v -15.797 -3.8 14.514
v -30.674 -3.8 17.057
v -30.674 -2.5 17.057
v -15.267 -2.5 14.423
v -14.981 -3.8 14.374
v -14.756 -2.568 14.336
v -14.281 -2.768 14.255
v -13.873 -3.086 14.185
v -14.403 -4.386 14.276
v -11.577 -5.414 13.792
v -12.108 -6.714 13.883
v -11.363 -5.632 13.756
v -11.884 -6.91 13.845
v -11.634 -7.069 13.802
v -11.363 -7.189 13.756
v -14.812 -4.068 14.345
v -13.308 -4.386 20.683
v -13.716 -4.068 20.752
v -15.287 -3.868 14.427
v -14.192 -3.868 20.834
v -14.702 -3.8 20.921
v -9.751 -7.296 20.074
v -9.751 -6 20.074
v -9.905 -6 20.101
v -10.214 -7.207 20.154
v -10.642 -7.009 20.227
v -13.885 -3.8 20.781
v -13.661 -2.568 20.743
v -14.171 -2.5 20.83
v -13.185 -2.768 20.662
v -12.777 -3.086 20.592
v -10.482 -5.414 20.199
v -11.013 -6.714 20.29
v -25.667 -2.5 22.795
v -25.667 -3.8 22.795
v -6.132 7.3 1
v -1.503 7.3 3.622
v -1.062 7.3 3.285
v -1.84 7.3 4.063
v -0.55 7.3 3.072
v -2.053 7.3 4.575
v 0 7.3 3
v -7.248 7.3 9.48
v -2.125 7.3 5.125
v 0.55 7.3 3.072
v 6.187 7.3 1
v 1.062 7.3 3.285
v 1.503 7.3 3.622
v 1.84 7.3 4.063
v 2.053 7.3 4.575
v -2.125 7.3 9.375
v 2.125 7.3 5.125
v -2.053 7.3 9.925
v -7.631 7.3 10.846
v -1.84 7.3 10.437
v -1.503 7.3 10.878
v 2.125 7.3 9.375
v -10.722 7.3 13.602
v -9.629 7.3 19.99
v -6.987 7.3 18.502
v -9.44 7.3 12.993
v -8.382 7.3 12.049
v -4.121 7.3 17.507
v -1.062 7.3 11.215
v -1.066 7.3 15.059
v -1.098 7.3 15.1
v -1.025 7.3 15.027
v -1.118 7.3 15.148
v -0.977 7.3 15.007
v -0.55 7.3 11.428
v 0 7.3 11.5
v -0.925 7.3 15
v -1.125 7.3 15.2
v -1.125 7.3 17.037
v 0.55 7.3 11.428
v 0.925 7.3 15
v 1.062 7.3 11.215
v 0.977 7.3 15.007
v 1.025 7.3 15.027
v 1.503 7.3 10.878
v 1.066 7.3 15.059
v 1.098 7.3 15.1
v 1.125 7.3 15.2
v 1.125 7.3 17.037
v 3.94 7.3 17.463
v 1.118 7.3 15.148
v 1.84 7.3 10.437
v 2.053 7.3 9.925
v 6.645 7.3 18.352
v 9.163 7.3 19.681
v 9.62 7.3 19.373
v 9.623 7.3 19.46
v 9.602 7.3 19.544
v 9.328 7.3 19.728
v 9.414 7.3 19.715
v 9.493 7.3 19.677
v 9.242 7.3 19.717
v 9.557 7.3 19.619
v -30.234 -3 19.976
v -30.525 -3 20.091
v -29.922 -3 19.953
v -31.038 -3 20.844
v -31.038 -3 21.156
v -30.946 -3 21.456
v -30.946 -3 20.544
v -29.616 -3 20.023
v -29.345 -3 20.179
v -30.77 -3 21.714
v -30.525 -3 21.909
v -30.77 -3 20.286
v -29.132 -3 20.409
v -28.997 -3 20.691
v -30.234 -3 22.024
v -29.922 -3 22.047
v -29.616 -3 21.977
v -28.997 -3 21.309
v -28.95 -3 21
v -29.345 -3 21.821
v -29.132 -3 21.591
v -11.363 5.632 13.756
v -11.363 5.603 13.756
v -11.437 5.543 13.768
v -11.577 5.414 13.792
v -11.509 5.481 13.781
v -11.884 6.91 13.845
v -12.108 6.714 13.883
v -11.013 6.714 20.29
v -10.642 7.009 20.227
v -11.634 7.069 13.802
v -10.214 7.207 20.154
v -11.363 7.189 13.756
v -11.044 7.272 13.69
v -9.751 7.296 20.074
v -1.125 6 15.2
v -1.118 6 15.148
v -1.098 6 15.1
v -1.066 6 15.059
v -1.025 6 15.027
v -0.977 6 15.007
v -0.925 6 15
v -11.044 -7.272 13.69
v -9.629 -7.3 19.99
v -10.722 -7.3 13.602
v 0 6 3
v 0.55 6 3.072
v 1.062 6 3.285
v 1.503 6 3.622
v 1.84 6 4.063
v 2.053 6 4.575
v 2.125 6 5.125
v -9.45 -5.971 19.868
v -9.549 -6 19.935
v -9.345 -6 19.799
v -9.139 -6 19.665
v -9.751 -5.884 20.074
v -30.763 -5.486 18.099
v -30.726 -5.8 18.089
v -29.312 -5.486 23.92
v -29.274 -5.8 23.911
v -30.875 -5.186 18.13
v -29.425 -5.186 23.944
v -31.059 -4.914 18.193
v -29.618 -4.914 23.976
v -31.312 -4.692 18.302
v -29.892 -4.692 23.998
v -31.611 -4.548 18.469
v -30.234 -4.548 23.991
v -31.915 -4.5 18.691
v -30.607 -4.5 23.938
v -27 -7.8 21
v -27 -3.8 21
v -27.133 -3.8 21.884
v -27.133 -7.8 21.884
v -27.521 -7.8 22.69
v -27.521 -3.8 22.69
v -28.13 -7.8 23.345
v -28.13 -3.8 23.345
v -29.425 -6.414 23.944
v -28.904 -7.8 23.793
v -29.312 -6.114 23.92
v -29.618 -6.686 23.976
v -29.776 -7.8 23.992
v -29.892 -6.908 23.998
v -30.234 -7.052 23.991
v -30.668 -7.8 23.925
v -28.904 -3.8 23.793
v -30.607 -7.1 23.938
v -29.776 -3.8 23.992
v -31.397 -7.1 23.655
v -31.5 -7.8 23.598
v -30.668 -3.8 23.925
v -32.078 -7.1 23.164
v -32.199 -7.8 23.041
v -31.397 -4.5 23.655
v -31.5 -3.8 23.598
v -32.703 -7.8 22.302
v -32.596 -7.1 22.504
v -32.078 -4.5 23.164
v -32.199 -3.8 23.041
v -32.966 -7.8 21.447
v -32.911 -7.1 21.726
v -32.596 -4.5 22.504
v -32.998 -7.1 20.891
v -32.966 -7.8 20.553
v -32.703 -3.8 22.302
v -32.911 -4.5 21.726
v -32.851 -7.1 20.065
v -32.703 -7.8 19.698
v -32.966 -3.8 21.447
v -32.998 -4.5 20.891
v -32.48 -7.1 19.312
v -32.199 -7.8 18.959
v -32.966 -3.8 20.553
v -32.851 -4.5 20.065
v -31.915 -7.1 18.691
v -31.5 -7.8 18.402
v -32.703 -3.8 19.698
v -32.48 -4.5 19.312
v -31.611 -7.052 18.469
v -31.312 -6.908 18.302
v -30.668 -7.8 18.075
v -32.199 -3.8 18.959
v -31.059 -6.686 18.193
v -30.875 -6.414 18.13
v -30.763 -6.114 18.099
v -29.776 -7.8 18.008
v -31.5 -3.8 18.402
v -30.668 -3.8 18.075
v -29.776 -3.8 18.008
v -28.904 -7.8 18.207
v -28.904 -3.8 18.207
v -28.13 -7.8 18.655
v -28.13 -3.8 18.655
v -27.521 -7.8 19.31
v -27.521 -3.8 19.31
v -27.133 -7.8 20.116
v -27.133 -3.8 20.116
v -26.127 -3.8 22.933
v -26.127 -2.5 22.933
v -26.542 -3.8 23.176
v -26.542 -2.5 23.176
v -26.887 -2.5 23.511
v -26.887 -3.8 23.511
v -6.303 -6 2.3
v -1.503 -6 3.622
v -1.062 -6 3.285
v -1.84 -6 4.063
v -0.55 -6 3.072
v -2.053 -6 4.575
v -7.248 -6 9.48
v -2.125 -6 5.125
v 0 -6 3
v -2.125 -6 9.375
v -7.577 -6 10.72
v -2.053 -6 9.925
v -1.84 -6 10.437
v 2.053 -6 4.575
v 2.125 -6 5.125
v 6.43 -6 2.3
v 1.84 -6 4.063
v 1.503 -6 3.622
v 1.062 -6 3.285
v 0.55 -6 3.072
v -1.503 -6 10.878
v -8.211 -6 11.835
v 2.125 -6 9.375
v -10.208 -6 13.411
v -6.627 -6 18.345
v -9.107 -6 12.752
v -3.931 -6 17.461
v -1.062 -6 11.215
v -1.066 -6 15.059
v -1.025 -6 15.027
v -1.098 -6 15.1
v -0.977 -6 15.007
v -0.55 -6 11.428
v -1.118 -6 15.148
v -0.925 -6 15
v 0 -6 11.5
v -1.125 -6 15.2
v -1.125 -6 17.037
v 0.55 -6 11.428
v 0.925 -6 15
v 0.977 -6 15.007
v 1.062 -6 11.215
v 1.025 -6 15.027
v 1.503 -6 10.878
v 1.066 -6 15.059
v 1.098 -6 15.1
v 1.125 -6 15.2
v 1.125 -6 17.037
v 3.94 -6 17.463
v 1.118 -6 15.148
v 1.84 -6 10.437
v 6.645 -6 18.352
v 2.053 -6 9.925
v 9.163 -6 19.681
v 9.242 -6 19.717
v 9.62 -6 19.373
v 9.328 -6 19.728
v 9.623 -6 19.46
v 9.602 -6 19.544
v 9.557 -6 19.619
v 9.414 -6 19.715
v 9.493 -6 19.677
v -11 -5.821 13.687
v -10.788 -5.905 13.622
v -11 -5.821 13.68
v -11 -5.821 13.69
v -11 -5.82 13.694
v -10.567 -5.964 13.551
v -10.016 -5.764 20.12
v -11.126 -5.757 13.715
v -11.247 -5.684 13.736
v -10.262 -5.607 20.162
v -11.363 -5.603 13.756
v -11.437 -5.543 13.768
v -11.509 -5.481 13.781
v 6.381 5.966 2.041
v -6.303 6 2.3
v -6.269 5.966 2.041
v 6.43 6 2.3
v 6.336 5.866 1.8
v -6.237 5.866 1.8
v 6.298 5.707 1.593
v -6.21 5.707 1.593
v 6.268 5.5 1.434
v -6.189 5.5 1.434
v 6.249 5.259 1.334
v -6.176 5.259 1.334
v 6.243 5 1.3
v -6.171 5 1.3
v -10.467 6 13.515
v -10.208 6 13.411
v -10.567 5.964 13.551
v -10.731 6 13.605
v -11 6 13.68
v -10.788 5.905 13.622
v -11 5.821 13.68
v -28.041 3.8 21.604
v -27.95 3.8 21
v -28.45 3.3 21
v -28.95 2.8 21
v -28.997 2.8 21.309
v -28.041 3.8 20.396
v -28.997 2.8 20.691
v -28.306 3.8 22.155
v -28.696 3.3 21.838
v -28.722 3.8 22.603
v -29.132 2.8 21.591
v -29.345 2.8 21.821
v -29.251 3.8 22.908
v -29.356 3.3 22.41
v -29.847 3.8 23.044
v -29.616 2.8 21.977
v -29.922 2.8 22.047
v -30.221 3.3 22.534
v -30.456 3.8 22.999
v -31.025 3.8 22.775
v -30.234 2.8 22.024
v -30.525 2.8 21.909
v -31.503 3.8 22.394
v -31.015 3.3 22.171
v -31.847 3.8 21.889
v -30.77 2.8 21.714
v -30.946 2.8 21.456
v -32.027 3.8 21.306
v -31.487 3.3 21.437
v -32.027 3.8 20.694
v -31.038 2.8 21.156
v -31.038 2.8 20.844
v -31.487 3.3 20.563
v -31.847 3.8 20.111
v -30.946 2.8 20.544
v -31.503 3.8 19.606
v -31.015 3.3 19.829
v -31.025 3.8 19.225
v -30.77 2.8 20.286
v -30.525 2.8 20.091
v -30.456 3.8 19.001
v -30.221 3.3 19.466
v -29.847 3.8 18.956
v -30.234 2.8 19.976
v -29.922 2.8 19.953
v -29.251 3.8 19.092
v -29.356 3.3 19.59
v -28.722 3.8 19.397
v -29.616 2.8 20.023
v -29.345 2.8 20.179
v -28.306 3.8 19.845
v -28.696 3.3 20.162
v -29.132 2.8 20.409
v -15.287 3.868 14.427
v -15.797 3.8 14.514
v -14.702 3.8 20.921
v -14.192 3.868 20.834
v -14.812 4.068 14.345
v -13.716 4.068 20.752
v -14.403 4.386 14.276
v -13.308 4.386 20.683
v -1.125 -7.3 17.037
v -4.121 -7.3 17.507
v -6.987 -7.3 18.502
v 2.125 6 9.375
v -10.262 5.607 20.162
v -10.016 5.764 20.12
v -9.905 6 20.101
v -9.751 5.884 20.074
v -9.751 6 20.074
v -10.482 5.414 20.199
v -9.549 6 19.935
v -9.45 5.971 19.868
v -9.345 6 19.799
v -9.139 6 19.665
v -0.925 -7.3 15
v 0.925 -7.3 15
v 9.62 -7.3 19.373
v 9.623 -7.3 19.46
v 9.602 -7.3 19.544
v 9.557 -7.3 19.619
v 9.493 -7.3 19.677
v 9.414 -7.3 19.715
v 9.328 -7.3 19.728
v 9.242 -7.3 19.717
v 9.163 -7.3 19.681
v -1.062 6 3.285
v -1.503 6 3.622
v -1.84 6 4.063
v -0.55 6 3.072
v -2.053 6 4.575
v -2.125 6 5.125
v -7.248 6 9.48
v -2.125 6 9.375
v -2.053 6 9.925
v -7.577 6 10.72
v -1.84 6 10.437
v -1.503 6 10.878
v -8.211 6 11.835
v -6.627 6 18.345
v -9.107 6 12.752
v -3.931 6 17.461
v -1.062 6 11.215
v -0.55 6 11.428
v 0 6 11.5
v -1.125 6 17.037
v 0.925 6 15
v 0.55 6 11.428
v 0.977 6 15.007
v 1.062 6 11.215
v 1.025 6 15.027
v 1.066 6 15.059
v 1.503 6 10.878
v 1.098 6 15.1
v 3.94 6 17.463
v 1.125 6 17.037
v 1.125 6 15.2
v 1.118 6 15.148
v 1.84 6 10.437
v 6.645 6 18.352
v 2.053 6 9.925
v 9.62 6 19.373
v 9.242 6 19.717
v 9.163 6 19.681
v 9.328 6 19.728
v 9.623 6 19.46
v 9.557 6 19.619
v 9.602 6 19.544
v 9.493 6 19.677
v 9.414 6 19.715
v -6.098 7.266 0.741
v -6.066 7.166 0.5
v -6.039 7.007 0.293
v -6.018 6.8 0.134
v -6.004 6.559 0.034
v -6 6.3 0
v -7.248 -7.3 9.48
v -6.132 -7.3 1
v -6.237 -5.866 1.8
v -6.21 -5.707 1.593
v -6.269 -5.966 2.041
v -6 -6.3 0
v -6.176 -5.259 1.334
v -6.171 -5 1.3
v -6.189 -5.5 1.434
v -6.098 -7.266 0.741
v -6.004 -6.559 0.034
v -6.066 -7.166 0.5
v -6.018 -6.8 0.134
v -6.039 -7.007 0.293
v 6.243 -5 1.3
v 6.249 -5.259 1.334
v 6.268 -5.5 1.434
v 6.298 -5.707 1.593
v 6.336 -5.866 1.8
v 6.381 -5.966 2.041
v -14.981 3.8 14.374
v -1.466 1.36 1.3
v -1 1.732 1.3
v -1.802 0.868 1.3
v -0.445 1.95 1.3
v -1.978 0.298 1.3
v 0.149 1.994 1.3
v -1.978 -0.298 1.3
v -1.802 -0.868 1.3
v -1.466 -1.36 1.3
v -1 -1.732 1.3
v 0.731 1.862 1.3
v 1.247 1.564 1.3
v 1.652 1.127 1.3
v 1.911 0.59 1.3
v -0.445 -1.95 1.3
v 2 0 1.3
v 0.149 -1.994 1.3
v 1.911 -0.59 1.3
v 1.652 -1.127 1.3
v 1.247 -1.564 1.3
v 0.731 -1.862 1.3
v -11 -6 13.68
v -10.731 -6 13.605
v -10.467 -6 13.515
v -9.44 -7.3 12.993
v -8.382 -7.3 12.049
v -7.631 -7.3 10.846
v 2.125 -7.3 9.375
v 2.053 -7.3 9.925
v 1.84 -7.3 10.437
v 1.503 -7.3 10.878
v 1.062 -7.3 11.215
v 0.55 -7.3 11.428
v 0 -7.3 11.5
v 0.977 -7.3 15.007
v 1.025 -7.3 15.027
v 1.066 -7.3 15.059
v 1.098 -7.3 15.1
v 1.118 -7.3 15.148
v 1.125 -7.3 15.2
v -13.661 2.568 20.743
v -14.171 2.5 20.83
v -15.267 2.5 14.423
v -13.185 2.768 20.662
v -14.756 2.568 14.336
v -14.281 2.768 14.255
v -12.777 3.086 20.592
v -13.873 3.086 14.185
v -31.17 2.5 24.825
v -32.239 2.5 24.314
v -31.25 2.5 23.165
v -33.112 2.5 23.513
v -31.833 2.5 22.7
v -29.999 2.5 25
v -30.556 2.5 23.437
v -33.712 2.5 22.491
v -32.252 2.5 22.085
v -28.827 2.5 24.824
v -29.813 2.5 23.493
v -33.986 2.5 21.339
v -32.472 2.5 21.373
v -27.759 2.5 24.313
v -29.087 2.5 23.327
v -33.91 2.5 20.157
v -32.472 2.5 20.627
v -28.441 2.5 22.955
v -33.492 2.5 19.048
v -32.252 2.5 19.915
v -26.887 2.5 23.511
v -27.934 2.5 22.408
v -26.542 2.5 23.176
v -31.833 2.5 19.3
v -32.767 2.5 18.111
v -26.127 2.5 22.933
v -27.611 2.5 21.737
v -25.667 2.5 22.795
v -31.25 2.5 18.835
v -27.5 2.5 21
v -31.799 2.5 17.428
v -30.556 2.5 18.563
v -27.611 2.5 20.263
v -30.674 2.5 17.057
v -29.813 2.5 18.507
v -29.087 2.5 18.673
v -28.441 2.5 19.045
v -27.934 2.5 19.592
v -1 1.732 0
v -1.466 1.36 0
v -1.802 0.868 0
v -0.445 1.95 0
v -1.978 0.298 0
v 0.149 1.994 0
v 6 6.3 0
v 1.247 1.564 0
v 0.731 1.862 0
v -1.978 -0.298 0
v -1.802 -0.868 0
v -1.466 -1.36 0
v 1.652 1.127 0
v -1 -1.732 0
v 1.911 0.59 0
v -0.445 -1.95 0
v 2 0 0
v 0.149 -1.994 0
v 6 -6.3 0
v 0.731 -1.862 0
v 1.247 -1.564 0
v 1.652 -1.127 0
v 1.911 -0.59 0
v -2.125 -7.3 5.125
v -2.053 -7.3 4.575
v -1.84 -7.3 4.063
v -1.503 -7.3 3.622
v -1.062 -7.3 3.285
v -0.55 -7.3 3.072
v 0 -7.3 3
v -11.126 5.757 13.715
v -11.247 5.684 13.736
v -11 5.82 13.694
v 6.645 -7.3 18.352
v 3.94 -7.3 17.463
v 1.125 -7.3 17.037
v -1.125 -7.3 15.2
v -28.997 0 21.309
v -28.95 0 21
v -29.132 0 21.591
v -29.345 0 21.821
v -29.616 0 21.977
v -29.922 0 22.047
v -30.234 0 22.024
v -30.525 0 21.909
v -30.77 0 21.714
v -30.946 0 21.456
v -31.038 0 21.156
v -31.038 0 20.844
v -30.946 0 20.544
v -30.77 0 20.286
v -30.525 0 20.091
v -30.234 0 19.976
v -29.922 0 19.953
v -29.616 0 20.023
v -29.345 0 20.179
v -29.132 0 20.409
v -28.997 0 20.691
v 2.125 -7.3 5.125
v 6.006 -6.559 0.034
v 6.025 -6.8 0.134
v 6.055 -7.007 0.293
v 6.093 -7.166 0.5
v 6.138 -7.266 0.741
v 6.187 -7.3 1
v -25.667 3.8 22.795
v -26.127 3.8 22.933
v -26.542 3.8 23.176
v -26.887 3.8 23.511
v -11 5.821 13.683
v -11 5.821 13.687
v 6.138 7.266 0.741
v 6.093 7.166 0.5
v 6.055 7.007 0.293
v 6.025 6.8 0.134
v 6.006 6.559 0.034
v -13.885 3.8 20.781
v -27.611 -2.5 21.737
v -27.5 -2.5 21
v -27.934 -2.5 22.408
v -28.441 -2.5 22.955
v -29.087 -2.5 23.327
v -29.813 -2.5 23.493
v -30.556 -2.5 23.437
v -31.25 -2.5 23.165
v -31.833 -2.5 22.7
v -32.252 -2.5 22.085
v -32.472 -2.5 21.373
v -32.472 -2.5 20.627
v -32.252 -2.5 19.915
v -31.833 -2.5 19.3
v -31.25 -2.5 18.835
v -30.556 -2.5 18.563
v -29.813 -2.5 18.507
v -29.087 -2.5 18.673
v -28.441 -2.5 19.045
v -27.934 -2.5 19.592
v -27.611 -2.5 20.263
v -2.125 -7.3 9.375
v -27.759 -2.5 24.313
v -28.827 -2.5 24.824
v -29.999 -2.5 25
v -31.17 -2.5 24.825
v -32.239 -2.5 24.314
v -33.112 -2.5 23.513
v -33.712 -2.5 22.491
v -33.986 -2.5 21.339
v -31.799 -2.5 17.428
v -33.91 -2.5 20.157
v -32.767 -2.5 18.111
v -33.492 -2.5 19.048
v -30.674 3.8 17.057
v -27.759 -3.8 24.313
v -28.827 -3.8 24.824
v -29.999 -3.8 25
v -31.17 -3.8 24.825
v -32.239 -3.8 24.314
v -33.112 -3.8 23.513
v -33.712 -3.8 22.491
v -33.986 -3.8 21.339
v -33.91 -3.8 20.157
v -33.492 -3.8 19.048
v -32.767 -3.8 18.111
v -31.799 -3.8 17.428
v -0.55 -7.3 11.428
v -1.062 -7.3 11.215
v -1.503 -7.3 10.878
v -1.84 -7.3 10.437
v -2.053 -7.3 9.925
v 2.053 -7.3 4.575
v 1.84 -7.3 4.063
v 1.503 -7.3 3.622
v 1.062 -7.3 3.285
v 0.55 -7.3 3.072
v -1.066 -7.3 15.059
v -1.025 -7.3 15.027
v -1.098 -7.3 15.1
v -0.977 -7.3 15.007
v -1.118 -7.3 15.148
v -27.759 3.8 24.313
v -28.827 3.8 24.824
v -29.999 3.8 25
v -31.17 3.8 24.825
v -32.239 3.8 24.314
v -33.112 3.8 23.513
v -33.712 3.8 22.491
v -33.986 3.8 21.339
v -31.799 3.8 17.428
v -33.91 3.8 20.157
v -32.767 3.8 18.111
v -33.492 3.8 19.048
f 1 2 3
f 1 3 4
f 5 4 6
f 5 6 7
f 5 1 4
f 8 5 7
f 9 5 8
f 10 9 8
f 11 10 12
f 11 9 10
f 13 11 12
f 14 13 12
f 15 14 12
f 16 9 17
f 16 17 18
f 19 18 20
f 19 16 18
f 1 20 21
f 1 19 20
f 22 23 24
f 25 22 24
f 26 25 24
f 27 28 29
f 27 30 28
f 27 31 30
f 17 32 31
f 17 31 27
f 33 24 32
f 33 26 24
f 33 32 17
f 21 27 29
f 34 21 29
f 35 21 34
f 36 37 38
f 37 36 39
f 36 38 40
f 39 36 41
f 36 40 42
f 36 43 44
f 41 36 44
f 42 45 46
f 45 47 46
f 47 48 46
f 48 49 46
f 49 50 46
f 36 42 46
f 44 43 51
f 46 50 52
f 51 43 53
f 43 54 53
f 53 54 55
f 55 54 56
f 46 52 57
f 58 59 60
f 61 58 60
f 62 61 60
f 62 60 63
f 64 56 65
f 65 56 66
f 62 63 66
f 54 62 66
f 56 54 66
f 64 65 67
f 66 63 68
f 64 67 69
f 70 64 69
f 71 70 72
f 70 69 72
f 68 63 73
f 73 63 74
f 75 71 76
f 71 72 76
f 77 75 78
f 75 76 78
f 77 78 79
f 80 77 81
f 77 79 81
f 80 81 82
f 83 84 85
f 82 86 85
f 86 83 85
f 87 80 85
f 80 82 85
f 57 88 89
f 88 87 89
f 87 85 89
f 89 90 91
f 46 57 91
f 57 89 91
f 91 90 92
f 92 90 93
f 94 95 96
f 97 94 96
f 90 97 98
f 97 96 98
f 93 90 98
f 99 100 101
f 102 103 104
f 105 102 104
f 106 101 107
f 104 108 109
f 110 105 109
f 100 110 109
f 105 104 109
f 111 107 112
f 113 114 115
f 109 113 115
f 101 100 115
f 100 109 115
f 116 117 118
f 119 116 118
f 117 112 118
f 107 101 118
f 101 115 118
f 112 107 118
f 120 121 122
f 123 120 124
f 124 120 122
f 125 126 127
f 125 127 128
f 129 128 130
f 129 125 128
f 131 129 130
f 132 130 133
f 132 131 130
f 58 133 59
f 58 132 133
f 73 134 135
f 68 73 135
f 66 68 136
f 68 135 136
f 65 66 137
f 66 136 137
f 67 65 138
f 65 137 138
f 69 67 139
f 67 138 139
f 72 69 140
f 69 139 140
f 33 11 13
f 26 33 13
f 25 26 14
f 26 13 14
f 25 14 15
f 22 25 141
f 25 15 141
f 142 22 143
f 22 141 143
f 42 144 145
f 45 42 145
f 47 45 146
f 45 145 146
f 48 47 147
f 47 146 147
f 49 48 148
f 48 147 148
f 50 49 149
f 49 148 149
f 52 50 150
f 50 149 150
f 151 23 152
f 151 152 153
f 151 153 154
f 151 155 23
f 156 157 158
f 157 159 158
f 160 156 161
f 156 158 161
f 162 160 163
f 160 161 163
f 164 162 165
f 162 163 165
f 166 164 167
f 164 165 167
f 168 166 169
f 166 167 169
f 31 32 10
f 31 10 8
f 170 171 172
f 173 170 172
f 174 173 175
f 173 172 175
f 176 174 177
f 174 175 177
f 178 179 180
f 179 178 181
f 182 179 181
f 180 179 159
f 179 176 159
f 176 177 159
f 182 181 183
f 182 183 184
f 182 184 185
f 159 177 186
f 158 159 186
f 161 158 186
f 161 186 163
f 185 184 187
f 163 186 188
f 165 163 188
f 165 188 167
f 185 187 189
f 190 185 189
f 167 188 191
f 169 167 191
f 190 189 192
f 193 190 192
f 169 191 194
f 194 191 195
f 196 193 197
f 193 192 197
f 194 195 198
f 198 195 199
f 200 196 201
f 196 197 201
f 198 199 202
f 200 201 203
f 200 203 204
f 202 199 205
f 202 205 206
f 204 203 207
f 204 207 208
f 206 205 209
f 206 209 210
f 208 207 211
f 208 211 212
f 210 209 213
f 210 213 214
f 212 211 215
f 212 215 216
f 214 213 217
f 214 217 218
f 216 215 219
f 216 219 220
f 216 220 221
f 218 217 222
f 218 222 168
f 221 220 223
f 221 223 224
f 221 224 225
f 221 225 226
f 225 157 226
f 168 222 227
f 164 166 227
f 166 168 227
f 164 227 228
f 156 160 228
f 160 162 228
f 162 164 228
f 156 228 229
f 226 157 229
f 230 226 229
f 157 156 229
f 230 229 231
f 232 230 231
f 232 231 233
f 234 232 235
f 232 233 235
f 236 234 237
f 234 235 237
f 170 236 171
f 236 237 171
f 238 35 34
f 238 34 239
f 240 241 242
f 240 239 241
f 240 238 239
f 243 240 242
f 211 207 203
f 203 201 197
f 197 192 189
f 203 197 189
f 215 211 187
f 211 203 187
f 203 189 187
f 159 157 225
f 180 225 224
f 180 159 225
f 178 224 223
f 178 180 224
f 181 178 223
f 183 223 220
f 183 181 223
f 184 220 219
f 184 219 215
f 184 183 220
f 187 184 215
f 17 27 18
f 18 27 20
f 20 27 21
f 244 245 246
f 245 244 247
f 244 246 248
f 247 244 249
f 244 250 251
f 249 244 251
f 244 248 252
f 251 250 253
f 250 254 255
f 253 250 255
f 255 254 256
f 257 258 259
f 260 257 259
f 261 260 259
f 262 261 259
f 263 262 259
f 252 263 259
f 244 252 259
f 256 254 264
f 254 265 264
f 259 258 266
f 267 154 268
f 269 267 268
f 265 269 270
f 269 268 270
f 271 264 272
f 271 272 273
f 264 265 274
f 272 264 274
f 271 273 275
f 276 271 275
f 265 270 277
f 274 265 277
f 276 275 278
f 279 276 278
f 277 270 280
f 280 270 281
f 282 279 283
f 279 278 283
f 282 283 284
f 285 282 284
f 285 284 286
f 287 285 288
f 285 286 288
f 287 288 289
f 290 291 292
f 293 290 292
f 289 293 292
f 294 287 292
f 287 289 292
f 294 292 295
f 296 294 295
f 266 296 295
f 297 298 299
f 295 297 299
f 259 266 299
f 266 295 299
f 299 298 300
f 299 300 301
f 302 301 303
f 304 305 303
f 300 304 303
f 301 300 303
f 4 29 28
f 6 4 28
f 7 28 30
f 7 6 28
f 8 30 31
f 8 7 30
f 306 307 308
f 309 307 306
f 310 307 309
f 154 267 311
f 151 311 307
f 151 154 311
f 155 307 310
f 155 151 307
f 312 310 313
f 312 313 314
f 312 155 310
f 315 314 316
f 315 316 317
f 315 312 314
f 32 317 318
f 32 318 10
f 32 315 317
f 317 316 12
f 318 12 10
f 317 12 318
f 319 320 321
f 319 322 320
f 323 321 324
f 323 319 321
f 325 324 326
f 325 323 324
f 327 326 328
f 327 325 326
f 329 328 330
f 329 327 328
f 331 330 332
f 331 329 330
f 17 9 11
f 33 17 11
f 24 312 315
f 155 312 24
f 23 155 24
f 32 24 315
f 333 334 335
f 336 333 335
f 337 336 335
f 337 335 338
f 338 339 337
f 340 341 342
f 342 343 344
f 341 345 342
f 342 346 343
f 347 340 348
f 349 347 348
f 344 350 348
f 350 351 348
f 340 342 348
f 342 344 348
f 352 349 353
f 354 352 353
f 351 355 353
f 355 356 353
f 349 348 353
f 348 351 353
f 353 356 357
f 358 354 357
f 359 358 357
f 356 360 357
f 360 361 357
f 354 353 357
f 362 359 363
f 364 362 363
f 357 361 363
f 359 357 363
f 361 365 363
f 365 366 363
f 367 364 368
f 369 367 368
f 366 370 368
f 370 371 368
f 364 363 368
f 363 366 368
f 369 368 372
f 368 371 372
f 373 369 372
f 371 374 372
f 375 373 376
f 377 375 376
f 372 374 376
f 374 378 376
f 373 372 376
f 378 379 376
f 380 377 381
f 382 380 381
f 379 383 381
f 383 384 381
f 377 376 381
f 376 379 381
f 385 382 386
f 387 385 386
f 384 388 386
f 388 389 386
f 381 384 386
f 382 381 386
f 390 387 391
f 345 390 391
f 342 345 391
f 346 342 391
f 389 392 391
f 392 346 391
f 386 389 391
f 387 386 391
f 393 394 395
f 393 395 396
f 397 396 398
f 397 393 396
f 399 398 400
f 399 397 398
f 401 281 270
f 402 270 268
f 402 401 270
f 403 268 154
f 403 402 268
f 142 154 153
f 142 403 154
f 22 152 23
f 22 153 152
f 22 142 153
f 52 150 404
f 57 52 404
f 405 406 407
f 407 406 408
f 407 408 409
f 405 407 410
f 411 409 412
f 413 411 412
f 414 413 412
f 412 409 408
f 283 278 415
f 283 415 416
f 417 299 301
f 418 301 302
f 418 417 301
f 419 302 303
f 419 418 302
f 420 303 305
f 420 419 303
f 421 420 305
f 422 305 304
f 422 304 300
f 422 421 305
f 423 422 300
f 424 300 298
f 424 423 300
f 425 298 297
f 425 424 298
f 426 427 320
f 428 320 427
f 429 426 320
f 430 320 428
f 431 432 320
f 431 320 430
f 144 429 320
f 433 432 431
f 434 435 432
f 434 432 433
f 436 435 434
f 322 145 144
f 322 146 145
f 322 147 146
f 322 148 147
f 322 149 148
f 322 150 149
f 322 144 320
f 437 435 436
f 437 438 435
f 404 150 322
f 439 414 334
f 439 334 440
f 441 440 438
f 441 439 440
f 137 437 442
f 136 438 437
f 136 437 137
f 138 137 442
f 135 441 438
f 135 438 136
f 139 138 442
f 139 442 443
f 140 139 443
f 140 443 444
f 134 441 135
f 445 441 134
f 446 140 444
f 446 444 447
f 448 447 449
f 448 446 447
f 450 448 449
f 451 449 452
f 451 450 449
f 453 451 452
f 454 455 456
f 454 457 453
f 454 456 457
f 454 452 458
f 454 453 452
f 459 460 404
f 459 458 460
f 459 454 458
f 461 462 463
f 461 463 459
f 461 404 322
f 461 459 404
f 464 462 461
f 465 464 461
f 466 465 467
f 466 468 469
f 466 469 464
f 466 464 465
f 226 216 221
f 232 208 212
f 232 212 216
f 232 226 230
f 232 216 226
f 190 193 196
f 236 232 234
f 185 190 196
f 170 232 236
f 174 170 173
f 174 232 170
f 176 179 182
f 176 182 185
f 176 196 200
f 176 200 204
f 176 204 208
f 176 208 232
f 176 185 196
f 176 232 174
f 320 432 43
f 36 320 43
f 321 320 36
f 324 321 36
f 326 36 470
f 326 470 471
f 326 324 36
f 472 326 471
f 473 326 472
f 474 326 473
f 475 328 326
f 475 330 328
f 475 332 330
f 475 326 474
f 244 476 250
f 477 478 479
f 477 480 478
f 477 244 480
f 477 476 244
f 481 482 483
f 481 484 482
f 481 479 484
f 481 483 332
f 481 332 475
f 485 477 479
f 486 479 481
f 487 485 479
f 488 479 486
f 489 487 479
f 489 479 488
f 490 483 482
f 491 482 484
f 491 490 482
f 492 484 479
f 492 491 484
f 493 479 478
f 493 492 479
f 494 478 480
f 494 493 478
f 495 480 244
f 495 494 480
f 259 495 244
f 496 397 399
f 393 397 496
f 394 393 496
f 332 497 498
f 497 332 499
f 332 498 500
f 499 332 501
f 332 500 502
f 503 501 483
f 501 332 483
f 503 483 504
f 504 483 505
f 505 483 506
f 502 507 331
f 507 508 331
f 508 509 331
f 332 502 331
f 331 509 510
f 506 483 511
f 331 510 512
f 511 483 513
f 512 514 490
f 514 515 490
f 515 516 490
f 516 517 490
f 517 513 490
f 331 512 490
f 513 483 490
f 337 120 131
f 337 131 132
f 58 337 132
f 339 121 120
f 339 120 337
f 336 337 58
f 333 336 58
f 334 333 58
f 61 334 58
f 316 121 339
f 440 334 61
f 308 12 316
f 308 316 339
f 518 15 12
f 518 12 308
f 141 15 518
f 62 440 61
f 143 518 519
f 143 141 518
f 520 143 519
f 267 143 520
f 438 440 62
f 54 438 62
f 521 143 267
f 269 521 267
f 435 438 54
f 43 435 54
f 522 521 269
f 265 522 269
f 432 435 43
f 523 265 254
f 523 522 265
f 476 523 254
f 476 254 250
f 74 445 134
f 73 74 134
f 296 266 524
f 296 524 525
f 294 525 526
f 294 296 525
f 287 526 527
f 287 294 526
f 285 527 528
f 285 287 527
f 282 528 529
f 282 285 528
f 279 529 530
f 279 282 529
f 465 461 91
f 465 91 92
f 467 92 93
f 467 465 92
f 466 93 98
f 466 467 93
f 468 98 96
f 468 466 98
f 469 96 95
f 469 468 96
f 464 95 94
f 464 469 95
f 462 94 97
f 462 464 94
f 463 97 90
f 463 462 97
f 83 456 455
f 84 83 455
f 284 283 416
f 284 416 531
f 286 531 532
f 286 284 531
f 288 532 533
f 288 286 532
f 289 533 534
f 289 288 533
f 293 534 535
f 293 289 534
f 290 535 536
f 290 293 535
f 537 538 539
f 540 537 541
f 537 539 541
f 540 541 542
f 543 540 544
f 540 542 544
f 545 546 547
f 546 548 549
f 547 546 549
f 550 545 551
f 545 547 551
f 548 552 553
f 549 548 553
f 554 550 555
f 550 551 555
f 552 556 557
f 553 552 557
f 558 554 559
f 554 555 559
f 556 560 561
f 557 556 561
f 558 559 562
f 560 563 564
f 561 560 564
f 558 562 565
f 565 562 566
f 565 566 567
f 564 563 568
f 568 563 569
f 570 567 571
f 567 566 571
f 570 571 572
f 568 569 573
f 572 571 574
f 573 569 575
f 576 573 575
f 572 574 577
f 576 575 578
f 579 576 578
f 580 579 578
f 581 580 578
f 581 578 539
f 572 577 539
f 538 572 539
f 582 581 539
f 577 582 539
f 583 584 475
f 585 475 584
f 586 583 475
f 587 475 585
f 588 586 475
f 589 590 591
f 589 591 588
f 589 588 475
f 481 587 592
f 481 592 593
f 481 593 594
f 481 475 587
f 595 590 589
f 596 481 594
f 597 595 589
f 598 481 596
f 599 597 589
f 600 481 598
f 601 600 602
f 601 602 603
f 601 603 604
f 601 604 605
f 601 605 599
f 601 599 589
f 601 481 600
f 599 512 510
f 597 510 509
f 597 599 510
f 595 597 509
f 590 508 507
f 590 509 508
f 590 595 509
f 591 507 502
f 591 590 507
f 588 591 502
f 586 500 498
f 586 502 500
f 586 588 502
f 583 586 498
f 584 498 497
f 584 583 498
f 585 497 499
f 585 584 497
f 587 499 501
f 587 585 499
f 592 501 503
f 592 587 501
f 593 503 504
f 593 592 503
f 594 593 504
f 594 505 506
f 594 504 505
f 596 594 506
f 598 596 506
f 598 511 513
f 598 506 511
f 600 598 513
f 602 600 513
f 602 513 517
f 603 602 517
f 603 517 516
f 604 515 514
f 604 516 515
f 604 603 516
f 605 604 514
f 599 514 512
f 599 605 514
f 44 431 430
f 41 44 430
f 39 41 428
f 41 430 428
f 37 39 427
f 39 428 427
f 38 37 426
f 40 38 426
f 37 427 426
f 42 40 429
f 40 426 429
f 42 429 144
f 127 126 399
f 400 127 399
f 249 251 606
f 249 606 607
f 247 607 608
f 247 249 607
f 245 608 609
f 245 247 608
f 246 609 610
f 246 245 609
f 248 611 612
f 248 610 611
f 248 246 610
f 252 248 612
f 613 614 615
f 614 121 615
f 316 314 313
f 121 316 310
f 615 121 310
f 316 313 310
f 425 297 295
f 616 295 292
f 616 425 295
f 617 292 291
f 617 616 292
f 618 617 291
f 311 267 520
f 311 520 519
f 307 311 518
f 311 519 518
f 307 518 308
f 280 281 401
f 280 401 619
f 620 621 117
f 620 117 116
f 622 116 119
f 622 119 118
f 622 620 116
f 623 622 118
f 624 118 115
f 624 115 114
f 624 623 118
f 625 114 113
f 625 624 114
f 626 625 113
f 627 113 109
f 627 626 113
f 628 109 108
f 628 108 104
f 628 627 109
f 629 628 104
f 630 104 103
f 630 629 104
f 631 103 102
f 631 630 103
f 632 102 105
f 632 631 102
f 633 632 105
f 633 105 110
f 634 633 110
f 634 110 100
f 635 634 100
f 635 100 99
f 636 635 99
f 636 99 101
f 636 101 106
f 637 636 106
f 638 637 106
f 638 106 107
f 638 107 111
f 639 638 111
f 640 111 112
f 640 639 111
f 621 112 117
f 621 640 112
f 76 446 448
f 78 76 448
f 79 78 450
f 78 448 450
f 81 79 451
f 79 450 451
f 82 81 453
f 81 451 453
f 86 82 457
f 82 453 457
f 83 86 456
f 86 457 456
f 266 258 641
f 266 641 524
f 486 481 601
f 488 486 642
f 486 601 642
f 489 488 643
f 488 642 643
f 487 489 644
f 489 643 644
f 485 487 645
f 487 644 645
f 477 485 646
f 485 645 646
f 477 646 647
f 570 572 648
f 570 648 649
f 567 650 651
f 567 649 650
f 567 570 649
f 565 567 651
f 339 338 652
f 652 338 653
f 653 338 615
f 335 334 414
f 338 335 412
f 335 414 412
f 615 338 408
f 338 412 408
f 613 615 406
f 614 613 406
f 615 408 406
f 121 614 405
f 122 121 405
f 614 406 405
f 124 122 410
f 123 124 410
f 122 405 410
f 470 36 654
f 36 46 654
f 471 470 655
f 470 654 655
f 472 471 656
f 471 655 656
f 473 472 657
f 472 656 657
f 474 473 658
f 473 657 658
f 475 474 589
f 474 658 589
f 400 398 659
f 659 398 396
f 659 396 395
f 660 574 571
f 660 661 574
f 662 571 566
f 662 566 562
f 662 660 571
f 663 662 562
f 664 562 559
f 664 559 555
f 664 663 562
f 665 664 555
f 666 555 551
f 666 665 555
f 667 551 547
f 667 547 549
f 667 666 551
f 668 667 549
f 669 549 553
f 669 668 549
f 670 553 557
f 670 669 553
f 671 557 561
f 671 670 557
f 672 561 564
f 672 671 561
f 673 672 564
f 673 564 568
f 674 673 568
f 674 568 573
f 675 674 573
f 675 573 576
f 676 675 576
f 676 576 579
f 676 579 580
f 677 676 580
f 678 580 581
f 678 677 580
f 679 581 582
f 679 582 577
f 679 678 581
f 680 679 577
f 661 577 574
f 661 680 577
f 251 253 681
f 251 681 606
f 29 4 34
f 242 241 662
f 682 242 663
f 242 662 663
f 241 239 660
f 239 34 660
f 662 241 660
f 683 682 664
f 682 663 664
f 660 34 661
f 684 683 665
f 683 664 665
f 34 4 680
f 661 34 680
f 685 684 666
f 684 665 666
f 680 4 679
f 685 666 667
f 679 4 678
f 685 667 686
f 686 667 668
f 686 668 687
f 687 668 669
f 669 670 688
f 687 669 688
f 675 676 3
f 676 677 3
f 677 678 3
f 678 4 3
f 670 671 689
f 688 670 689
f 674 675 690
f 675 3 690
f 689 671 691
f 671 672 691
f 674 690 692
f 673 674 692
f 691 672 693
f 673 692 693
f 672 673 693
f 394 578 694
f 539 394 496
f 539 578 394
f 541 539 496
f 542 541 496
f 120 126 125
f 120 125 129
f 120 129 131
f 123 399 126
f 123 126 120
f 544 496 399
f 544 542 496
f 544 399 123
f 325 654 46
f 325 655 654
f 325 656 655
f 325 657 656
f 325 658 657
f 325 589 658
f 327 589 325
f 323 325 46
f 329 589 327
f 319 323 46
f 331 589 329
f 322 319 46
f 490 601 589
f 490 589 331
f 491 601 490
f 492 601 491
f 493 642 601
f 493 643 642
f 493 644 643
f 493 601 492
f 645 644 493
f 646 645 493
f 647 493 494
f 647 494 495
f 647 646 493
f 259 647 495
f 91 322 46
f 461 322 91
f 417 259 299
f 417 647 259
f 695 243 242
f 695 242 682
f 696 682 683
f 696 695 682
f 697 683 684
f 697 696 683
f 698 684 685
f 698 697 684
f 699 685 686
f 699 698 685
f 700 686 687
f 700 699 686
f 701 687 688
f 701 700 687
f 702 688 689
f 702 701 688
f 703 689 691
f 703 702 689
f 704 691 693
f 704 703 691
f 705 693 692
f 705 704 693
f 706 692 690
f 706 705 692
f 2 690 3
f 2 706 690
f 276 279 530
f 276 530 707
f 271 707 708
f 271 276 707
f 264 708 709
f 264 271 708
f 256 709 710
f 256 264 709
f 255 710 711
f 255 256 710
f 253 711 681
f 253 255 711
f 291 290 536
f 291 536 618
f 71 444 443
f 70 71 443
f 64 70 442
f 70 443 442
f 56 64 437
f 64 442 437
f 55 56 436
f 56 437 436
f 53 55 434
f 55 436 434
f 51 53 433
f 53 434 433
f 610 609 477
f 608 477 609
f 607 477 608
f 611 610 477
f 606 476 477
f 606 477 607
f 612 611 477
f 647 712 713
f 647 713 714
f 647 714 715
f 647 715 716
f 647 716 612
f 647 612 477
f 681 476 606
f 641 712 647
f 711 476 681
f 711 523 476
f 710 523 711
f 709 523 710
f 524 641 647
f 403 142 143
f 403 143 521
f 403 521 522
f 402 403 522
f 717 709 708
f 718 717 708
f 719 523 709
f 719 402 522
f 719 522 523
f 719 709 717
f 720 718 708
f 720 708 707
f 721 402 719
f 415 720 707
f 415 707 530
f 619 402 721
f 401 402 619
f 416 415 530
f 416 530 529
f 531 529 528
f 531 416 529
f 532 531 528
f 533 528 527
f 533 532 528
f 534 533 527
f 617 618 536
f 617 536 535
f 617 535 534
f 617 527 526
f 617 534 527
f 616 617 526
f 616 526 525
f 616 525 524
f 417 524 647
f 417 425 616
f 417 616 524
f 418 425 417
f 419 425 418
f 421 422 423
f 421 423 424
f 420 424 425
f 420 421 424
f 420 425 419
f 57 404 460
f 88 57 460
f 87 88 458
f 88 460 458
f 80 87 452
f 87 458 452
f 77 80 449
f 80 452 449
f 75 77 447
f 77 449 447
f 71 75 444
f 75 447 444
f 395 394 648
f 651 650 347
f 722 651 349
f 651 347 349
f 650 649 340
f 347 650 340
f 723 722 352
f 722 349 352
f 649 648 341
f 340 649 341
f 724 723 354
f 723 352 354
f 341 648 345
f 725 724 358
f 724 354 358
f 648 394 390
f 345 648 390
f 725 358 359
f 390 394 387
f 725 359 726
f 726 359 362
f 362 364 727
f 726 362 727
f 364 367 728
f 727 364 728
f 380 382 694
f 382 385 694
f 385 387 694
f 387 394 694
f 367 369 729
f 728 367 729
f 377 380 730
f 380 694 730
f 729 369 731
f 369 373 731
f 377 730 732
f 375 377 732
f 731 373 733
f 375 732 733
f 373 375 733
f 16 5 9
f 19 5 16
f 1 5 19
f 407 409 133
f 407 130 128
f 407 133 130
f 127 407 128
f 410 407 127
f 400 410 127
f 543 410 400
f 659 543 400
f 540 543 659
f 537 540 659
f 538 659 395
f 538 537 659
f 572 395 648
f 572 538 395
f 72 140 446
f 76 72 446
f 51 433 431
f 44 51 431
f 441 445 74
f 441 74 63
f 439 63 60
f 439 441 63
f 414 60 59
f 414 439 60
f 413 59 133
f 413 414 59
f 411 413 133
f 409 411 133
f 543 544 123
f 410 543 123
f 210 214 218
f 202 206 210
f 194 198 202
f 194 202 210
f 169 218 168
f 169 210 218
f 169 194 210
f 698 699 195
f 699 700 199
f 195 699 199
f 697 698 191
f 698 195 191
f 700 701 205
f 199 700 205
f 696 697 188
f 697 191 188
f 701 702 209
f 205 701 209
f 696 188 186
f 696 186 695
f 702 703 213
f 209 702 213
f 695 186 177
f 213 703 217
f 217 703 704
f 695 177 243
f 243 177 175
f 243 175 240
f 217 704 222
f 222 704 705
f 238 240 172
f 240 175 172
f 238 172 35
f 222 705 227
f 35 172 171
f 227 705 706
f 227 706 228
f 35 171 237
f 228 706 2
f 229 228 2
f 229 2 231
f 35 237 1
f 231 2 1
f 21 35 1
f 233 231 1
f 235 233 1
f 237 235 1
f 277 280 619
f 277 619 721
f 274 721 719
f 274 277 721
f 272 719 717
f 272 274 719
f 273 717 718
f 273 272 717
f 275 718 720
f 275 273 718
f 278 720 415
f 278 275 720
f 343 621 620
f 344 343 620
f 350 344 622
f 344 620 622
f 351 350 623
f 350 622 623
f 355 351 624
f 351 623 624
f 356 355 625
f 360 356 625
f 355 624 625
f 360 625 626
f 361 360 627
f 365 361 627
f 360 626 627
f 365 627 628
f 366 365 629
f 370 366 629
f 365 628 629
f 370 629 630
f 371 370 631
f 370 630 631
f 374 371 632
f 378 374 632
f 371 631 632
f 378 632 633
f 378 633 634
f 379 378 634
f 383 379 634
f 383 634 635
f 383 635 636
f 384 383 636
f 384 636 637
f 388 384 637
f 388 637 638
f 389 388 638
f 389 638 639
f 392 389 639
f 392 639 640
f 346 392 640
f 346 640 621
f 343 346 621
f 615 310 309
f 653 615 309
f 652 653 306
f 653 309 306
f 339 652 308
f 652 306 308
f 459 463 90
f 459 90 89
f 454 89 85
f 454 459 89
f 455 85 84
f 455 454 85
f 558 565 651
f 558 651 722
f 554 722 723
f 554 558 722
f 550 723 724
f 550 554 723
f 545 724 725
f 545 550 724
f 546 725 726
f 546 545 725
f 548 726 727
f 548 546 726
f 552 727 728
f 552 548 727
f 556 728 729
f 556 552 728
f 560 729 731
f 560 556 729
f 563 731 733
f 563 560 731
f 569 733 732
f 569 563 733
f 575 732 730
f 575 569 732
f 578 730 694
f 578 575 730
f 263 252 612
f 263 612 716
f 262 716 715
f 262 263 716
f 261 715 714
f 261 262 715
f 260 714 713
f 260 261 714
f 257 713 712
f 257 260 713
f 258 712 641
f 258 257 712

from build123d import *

# Parameters (mm, degrees)
F1_DEPTH       = 7.3
F1_DEPTH_BACK  = 7.3
F3_DEPTH       = 6
F3_DEPTH_BACK  = 6
F5_DEPTH       = 10
F5_DEPTH_BACK  = 10
F8_DEPTH       = 25
F9_R           = 2.5
F10_DEPTH      = 2.5
F10_DEPTH_BACK = 2.5
F11_T1_DEPTH   = 6.5
F11_T6_DEPTH   = 12.7132034356
F11_S7_R       = 5
F11_T8_DEPTH   = 8
F11_S10_R      = 17
F11_T11_DEPTH  = 8
F11_T15_DEPTH  = 8.5710678119
F11_T20_DEPTH  = 12.7132034356
F11_S21_R      = 5
F11_T22_DEPTH  = 8
F11_S24_R      = 17
F11_T25_DEPTH  = 8
F11_T29_DEPTH  = 8.5710678119
F11_T31_DEPTH  = 10.6421356237
F12_R          = 1
F13_R          = 2
F14_DEPTH      = 5
F15_R          = 1.05
F16_DEPTH      = 3
F16_DEPTH_BACK = 10
F17_SIZE       = 1
F19_START      = 3.8
F18_R          = 3
F19_DEPTH      = 4
F21_START      = 4.5
F21_DEPTH      = 2.6
F22_R          = 1.29999


# Not quite as in the source:
# - a fillet or chamfer that OpenCascade refuses, or shapes differently, is made with other operations: its cross-section is extruded or revolved along the edge and cut away or added
# - a fillet or chamfer is up to 0.001 mm smaller than in the source, because OpenCascade refuses the exact size


with BuildPart() as f1:
    # F0 (on Front) → F1 (new body, two sides)
    with BuildSketch(Plane.XZ) as f1_sk:
        with BuildLine():
            Line((-7.2480415045, 9.479816391), (-6, 0))
            Line((-6, 0), (6, 0))
            Line((6, 0), (9.6197658273, 19.3731186918))
            ThreePointArc((9.6197658273, 19.3731186918), (9.492555749, 19.6769779623), (9.1631662961, 19.6809084286))
            ThreePointArc((9.1631662961, 19.6809084286), (-0.3536100614, 17.0036780472), (-9.750799418, 20.0744152471))
            Line((-9.750799418, 20.0744152471), (-25.666835692, 22.7954629152))
            ThreePointArc((-25.666835692, 22.7954629152), (-26.3420622378, 23.0419468668), (-26.8865335991, 23.511240126))
            ThreePointArc((-26.8865335991, 23.511240126), (-33.4498266444, 23.0245236782), (-30.6740705867, 17.0572054525))
            Line((-30.6740705867, 17.0572054525), (-11.362677578, 13.7556786143))
            ThreePointArc((-11.362677578, 13.7556786143), (-8.6024605414, 12.2941429125), (-7.2480415045, 9.479816391))
        make_face()
    extrude(amount=F1_DEPTH)
    extrude(f1_sk.sketch, amount=-F1_DEPTH_BACK)

    # F2 (on Front) → F3 (cut, two sides)
    with BuildSketch(Plane.XZ) as f3_sk:
        Polygon((15, 1.3), (15, 78.0352148958), (0, 78.0352148958), (-11, 13.6936742961), (-11, 1.3), align=None)
    extrude(amount=F3_DEPTH, mode=Mode.SUBTRACT)
    extrude(f3_sk.sketch, amount=-F3_DEPTH_BACK, mode=Mode.SUBTRACT)

    # F4 (on Front) → F5 (cut, two sides)
    with BuildSketch(Plane.XZ) as f5_sk:
        with BuildLine():
            Line((0, 18), (-1.125, 18))
            Line((-1.125, 18), (-1.125, 15.2))
            ThreePointArc((-1.125, 15.2), (-1.0664213562, 15.0585786438), (-0.925, 15))
            Line((-0.925, 15), (0, 15))
            Line((0, 15), (0.925, 15))
            ThreePointArc((0.925, 15), (1.0664213562, 15.0585786438), (1.125, 15.2))
            Line((1.125, 15.2), (1.125, 18))
            Line((1.125, 18), (0, 18))
        make_face()
        with BuildLine():
            ThreePointArc((0, 11.5), (-1.50260191, 10.87760191), (-2.125, 9.375))
            Line((-2.125, 9.375), (-2.125, 5.125))
            ThreePointArc((-2.125, 5.125), (-1.50260191, 3.62239809), (0, 3))
            ThreePointArc((0, 3), (1.50260191, 3.62239809), (2.125, 5.125))
            Line((2.125, 5.125), (2.125, 9.375))
            ThreePointArc((2.125, 9.375), (1.50260191, 10.87760191), (0, 11.5))
        make_face()
    extrude(amount=F5_DEPTH, mode=Mode.SUBTRACT)
    extrude(f5_sk.sketch, amount=-F5_DEPTH_BACK, mode=Mode.SUBTRACT)

    # F7 (on offset) → F8 (cut)
    with BuildSketch(Plane(origin=(1.9622434031, 0, 11.4776148716), x_dir=(0.9856986369, 0, -0.1685176467), z_dir=(-0.1685176467, 0, -0.9856986369))):
        Polygon((-41.9907133171, -7.3), (-13.6887884036, -7.3), (-17.1887884036, -3.8), (-41.9907133171, -3.8), align=None)
        Polygon((-41.9907133171, 7.3), (-41.9907133171, 3.8), (-17.1887884036, 3.8), (-13.6887884036, 7.3), align=None)
        Polygon((-16.6503107725, -2.5), (-13.1503107725, -6), (-13.1503107725, 0), (-13.1503107725, 6), (-16.6503107725, 2.5), (-41.9907133171, 2.5), (-41.9907133171, 0), (-41.9907133171, -2.5), align=None)
    extrude(amount=-F8_DEPTH, mode=Mode.SUBTRACT)

    # F9 (on Front) → F10 (join, two sides)
    with BuildSketch(Plane.XZ) as f10_sk:
        with Locations((-30, 21)):
            Circle(F9_R)
    extrude(amount=F10_DEPTH)
    extrude(f10_sk.sketch, amount=-F10_DEPTH_BACK)

    # F11: fillet of radius 2 on 8 edges, made by hand

    # F11_s2 → F11_t1 (join)
    with BuildSketch(Plane(origin=(1.9622434031, 0, 11.4776148716), x_dir=(0, 1, 0), z_dir=(0.1685176467, 0, 0.9856986369))):
        with BuildLine():
            ThreePointArc((3.8, 18.0172155284), (3.952240935, 17.2518486636), (4.3857864376, 16.603001966))
            Line((4.3857864376, 16.603001966), (3.8, 17.1887884036))
            Line((3.8, 17.1887884036), (3.8, 18.0172155284))
        make_face()
        with BuildLine():
            ThreePointArc((-4.3857864376, 16.603001966), (-3.952240935, 17.2518486636), (-3.8, 18.0172155284))
            Line((-3.8, 18.0172155284), (-3.8, 17.1887884036))
            Line((-3.8, 17.1887884036), (-4.3857864376, 16.603001966))
        make_face()
    extrude(amount=F11_T1_DEPTH)


with BuildPart() as f11_tool4:
    # F11_s5 → F11_t6 (new body)
    with BuildSketch(Plane(origin=(3.0576081065, 0, 17.8846560114), x_dir=(0, 1, 0), z_dir=(-0.1685176467, 0, -0.9856986369))):
        with BuildLine():
            ThreePointArc((-6, -12.3218836478), (-5.847759065, -13.0872505125), (-5.4142135624, -13.7360972102))
            Line((-5.4142135624, -13.7360972102), (-6, -13.1503107725))
            Line((-6, -13.1503107725), (-6, -12.3218836478))
        make_face()
    extrude(amount=F11_T6_DEPTH)

    # F11_s7 → F11_t8 (cut, symmetric)
    with BuildSketch(Plane.XZ.offset(5.7)):
        with Locations((-12.2052658114, 8.8271854299)):
            Circle(F11_S7_R)
    extrude(amount=F11_T8_DEPTH, both=True, mode=Mode.SUBTRACT)

    split(bisect_by=Plane.YZ.offset(-11), keep=Keep.TOP)

    # F11_s10 → F11_t11 (cut, symmetric)
    with BuildSketch(Plane.XZ.offset(5.7)):
        with Locations((0, 34)):
            Circle(F11_S10_R)
    extrude(amount=F11_T11_DEPTH, both=True, mode=Mode.SUBTRACT)


with BuildPart() as f1_1:
    add(f1.part)

    # F11_t3: union F11_tool4
    add(f11_tool4.part)


with BuildPart() as f11_tool13:
    # F11_s14 → F11_t15 (new body)
    with BuildSketch(Plane(origin=(3.4066195803, 0, 19.9261047304), x_dir=(0, 1, 0), z_dir=(-0.1685176467, 0, -0.9856986369))):
        with BuildLine():
            ThreePointArc((-6, -12.3218836478), (-5.847759065, -13.0872505125), (-5.4142135624, -13.7360972102))
            Line((-5.4142135624, -13.7360972102), (-6, -13.1503107725))
            Line((-6, -13.1503107725), (-6, -12.3218836478))
        make_face()
    extrude(amount=F11_T15_DEPTH)

    split(bisect_by=Plane.YZ.offset(-11), keep=Keep.BOTTOM)


with BuildPart() as f1_2:
    add(f1_1.part)

    # F11_t12: union F11_tool13
    add(f11_tool13.part)


with BuildPart() as f11_tool18:
    # F11_s19 → F11_t20 (new body)
    with BuildSketch(Plane(origin=(3.0576081065, 0, 17.8846560114), x_dir=(0, 1, 0), z_dir=(-0.1685176467, 0, -0.9856986369))):
        with BuildLine():
            ThreePointArc((6, -12.3218836478), (5.847759065, -13.0872505125), (5.4142135624, -13.7360972102))
            Line((5.4142135624, -13.7360972102), (6, -13.1503107725))
            Line((6, -13.1503107725), (6, -12.3218836478))
        make_face()
    extrude(amount=F11_T20_DEPTH)

    # F11_s21 → F11_t22 (cut, symmetric)
    with BuildSketch(Plane.XZ.offset(-5.7)):
        with Locations((-12.2052658114, 8.8271854299)):
            Circle(F11_S21_R)
    extrude(amount=F11_T22_DEPTH, both=True, mode=Mode.SUBTRACT)

    split(bisect_by=Plane.YZ.offset(-11), keep=Keep.TOP)

    # F11_s24 → F11_t25 (cut, symmetric)
    with BuildSketch(Plane.XZ.offset(-5.7)):
        with Locations((0, 34)):
            Circle(F11_S24_R)
    extrude(amount=F11_T25_DEPTH, both=True, mode=Mode.SUBTRACT)


with BuildPart() as f1_3:
    add(f1_2.part)

    # F11_t17: union F11_tool18
    add(f11_tool18.part)


with BuildPart() as f11_tool27:
    # F11_s28 → F11_t29 (new body)
    with BuildSketch(Plane(origin=(3.4066195803, 0, 19.9261047304), x_dir=(0, 1, 0), z_dir=(-0.1685176467, 0, -0.9856986369))):
        with BuildLine():
            ThreePointArc((6, -12.3218836478), (5.847759065, -13.0872505125), (5.4142135624, -13.7360972102))
            Line((5.4142135624, -13.7360972102), (6, -13.1503107725))
            Line((6, -13.1503107725), (6, -12.3218836478))
        make_face()
    extrude(amount=F11_T29_DEPTH)

    split(bisect_by=Plane.YZ.offset(-11), keep=Keep.BOTTOM)


with BuildPart() as f1_4:
    add(f1_3.part)

    # F11_t26: union F11_tool27
    add(f11_tool27.part)

    # F11_s32 → F11_t31 (cut)
    with BuildSketch(Plane(origin=(1.6132319293, 0, 9.4361661525), x_dir=(0, 1, 0), z_dir=(0.1685176467, 0, 0.9856986369))):
        with BuildLine():
            ThreePointArc((6.7142135624, 14.2745748413), (7.147759065, 13.6257281436), (7.3, 12.8603612789))
            Line((7.3, 12.8603612789), (7.3, 13.6887884036))
            Line((7.3, 13.6887884036), (6.7142135624, 14.2745748413))
        make_face()
        with BuildLine():
            ThreePointArc((-2.5, 17.4787378973), (-2.652240935, 16.7133710326), (-3.0857864376, 16.0645243349))
            Line((-3.0857864376, 16.0645243349), (-2.5, 16.6503107725))
            Line((-2.5, 16.6503107725), (-2.5, 17.4787378973))
        make_face()
        with BuildLine():
            ThreePointArc((-6.7142135624, 14.2745748413), (-7.147759065, 13.6257281436), (-7.3, 12.8603612789))
            Line((-7.3, 12.8603612789), (-7.3, 13.6887884036))
            Line((-7.3, 13.6887884036), (-6.7142135624, 14.2745748413))
        make_face()
        with BuildLine():
            ThreePointArc((2.5, 17.4787378973), (2.652240935, 16.7133710326), (3.0857864376, 16.0645243349))
            Line((3.0857864376, 16.0645243349), (2.5, 16.6503107725))
            Line((2.5, 16.6503107725), (2.5, 17.4787378973))
        make_face()
    extrude(amount=F11_T31_DEPTH, mode=Mode.SUBTRACT)

    # F12
    f12_edges = [f1_4.edges().sort_by_distance(p)[0] for p in [
        (0.035875, 6, 1.3),
        (0, -7.3, 0),
        (0.035875, -6, 1.3),
        (0, 7.3, 0),
    ]]
    fillet(f12_edges, radius=F12_R)

    # F13 (on Top) → F14 (cut)
    with BuildSketch(Plane.XY):
        Circle(F13_R)
    extrude(amount=F14_DEPTH, mode=Mode.SUBTRACT)

    # F15 (on Front) → F16 (cut, two sides)
    with BuildSketch(Plane.XZ) as f16_sk:
        with Locations((-30, 21)):
            Circle(F15_R)
    extrude(amount=F16_DEPTH, mode=Mode.SUBTRACT)
    extrude(f16_sk.sketch, amount=-F16_DEPTH_BACK, mode=Mode.SUBTRACT)

    # F17
    f17_edges = [f1_4.edges().sort_by_distance(p)[0] for p in [
        (-31.05, 3.8, 21),
    ]]
    chamfer(f17_edges, length=F17_SIZE)

    # F18 (on Front) → F19 (join)
    with BuildSketch(Plane.XZ.offset(F19_START)):
        with Locations((-30, 21)):
            Circle(F18_R)
    extrude(amount=F19_DEPTH)

    # F20 (on Front) → F21 (cut)
    with BuildSketch(Plane.XZ.offset(F21_START)):
        Polygon((-40.5470757535, 15.9000791133), (-31.814414217, 13.7227820529), (-28.185585783, 28.2772179471), (-36.9182473195, 30.4545150075), align=None)
    extrude(amount=F21_DEPTH, mode=Mode.SUBTRACT)

    # F22 (radius 1.3 in the source; OpenCascade refuses exactly that, so slightly less here)
    f22_edges = [f1_4.edges().sort_by_distance(p)[0] for p in [
        (-30, -4.5, 21),
        (-30, -7.1, 21),
    ]]
    fillet(f22_edges, radius=F22_R)


solid = f1_4.part
